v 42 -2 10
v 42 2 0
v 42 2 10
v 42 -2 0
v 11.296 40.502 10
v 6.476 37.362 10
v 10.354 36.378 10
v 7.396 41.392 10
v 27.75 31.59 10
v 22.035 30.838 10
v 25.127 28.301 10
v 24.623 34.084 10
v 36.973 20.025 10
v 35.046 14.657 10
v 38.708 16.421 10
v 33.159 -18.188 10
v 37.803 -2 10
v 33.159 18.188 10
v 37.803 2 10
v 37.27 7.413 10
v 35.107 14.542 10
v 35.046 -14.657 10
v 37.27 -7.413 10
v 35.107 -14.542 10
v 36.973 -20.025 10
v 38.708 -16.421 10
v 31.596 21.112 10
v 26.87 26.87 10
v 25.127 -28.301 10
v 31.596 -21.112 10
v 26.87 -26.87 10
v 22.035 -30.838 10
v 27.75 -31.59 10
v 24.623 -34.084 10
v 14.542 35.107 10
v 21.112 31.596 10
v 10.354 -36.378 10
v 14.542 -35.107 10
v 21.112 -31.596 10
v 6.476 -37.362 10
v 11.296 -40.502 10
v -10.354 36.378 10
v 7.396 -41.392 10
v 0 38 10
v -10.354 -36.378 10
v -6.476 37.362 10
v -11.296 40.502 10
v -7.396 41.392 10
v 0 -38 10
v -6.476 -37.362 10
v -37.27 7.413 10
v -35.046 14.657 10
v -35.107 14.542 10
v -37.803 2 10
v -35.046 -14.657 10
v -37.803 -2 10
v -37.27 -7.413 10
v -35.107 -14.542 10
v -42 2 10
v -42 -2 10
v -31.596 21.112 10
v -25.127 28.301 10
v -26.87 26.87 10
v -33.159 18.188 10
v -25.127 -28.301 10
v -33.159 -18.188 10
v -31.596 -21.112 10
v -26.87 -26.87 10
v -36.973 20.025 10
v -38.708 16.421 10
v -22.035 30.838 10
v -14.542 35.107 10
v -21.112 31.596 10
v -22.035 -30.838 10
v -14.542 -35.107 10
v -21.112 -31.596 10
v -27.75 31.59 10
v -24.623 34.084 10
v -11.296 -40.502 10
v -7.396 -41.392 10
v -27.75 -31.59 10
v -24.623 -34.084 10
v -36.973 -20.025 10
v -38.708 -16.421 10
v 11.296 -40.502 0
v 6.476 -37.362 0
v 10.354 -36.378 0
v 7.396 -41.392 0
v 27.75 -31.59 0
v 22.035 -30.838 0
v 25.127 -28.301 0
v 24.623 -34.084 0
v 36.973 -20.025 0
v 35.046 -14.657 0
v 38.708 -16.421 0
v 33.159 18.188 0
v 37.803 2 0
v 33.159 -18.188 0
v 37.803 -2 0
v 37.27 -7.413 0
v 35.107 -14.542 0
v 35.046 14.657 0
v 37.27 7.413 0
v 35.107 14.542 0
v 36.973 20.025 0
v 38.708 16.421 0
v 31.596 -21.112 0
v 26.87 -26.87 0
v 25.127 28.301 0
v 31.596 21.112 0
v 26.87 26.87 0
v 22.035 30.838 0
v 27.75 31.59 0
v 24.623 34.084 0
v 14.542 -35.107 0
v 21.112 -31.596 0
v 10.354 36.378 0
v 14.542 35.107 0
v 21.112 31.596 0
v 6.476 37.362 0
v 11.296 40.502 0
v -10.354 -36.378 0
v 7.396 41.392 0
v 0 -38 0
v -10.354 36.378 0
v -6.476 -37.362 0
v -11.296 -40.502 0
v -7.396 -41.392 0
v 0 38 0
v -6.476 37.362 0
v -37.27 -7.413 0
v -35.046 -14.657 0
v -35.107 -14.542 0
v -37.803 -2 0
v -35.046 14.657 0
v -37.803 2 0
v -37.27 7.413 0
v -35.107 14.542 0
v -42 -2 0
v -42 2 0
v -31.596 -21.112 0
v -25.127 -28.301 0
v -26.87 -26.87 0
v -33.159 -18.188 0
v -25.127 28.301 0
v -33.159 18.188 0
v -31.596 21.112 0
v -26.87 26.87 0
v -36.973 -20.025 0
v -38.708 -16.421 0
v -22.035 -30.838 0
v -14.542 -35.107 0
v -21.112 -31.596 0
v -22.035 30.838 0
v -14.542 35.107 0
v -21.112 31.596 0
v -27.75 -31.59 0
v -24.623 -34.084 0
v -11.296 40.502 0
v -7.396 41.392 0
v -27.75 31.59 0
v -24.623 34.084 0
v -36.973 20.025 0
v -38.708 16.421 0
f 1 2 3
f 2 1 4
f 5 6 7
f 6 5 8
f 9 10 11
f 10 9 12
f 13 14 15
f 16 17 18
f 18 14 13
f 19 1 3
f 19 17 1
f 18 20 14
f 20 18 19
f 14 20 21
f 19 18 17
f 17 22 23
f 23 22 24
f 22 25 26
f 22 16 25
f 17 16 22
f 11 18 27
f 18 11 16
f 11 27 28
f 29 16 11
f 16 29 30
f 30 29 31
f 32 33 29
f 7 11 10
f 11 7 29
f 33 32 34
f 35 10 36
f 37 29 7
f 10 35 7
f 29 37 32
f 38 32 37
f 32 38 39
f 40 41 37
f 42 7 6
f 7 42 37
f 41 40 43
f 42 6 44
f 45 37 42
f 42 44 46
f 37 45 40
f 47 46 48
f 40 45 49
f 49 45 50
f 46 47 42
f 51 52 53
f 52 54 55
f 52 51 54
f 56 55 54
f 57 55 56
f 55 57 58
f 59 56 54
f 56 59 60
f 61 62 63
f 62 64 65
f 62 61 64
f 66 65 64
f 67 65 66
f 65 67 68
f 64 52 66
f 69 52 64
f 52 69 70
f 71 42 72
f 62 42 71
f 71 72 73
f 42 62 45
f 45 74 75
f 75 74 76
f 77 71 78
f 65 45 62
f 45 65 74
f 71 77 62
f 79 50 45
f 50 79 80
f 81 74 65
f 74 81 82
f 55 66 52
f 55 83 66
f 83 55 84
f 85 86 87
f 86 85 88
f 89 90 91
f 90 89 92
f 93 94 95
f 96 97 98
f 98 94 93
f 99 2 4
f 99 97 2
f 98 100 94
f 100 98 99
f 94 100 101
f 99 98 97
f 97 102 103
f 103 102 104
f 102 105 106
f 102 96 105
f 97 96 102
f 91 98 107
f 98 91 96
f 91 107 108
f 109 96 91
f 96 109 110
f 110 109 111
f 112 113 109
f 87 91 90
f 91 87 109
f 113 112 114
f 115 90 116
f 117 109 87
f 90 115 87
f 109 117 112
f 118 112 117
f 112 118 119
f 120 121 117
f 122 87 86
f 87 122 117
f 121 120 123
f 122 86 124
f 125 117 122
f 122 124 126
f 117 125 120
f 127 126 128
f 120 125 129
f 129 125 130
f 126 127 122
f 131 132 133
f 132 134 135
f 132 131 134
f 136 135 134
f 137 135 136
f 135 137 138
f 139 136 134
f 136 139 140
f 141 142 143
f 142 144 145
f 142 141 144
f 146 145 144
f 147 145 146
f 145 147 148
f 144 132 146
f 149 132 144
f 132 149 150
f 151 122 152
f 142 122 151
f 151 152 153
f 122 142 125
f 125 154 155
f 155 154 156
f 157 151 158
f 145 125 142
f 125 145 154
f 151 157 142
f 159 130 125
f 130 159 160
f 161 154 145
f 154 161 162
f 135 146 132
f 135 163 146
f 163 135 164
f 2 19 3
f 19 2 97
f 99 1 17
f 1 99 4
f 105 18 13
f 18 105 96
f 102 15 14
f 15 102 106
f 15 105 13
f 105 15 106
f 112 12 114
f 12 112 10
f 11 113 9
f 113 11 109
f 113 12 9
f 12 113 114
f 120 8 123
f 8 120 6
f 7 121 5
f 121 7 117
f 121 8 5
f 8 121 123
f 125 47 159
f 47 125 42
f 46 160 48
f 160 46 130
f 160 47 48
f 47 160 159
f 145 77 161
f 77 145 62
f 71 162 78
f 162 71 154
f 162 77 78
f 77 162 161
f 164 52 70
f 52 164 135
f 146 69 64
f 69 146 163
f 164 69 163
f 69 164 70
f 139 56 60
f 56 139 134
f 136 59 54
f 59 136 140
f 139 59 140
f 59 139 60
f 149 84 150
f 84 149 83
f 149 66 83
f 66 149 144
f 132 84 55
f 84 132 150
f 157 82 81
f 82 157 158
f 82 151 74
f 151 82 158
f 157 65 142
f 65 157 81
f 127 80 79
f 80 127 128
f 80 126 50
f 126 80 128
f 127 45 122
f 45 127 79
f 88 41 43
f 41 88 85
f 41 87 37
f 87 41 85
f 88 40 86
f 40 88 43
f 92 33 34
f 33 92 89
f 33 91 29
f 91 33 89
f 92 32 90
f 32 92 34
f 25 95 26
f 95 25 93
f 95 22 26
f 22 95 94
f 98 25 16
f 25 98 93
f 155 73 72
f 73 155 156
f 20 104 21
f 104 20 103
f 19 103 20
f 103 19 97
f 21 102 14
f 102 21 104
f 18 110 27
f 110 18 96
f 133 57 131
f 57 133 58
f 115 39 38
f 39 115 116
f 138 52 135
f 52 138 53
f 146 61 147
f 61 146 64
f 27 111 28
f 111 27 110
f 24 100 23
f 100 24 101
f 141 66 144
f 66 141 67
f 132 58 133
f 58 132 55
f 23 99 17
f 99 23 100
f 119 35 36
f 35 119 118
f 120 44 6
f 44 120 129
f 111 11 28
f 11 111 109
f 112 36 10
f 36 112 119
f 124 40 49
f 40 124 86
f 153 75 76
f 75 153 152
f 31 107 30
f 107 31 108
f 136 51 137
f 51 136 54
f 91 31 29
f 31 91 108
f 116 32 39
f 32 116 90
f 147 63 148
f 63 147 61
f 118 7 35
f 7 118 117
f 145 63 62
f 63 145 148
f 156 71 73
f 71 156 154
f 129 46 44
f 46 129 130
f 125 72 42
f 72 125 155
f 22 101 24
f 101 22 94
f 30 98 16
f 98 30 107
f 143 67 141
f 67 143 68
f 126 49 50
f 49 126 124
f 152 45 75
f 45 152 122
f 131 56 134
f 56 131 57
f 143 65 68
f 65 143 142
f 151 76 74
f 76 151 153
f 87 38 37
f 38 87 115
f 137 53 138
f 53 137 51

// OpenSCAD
$fn = 32;

// ----------------------------------------------------------------------
// Spur blank: plain gear blank
// ----------------------------------------------------------------------

// --- parameters (mm) ---
disc_r = 38;              // blank root radius
disc_t = 10;              // blank thickness
n_teeth = 14;             // stub tooth count
tooth_w = 4;              // tooth width at the root
tooth_h = 4;              // tooth height above the root

out_r = disc_r + tooth_h;  // tip radius
bbox_x = 84.0;  // measured width over the teeth
bbox_y = 82.78;  // measured depth over the teeth

union() {
  cylinder(r = disc_r, h = disc_t);
  for (i = [0 : n_teeth - 1])
    rotate([0, 0, i * 360 / n_teeth])
      translate([disc_r - 1, -tooth_w / 2, 0])
        cube([tooth_h + 1, tooth_w, disc_t]);
}
